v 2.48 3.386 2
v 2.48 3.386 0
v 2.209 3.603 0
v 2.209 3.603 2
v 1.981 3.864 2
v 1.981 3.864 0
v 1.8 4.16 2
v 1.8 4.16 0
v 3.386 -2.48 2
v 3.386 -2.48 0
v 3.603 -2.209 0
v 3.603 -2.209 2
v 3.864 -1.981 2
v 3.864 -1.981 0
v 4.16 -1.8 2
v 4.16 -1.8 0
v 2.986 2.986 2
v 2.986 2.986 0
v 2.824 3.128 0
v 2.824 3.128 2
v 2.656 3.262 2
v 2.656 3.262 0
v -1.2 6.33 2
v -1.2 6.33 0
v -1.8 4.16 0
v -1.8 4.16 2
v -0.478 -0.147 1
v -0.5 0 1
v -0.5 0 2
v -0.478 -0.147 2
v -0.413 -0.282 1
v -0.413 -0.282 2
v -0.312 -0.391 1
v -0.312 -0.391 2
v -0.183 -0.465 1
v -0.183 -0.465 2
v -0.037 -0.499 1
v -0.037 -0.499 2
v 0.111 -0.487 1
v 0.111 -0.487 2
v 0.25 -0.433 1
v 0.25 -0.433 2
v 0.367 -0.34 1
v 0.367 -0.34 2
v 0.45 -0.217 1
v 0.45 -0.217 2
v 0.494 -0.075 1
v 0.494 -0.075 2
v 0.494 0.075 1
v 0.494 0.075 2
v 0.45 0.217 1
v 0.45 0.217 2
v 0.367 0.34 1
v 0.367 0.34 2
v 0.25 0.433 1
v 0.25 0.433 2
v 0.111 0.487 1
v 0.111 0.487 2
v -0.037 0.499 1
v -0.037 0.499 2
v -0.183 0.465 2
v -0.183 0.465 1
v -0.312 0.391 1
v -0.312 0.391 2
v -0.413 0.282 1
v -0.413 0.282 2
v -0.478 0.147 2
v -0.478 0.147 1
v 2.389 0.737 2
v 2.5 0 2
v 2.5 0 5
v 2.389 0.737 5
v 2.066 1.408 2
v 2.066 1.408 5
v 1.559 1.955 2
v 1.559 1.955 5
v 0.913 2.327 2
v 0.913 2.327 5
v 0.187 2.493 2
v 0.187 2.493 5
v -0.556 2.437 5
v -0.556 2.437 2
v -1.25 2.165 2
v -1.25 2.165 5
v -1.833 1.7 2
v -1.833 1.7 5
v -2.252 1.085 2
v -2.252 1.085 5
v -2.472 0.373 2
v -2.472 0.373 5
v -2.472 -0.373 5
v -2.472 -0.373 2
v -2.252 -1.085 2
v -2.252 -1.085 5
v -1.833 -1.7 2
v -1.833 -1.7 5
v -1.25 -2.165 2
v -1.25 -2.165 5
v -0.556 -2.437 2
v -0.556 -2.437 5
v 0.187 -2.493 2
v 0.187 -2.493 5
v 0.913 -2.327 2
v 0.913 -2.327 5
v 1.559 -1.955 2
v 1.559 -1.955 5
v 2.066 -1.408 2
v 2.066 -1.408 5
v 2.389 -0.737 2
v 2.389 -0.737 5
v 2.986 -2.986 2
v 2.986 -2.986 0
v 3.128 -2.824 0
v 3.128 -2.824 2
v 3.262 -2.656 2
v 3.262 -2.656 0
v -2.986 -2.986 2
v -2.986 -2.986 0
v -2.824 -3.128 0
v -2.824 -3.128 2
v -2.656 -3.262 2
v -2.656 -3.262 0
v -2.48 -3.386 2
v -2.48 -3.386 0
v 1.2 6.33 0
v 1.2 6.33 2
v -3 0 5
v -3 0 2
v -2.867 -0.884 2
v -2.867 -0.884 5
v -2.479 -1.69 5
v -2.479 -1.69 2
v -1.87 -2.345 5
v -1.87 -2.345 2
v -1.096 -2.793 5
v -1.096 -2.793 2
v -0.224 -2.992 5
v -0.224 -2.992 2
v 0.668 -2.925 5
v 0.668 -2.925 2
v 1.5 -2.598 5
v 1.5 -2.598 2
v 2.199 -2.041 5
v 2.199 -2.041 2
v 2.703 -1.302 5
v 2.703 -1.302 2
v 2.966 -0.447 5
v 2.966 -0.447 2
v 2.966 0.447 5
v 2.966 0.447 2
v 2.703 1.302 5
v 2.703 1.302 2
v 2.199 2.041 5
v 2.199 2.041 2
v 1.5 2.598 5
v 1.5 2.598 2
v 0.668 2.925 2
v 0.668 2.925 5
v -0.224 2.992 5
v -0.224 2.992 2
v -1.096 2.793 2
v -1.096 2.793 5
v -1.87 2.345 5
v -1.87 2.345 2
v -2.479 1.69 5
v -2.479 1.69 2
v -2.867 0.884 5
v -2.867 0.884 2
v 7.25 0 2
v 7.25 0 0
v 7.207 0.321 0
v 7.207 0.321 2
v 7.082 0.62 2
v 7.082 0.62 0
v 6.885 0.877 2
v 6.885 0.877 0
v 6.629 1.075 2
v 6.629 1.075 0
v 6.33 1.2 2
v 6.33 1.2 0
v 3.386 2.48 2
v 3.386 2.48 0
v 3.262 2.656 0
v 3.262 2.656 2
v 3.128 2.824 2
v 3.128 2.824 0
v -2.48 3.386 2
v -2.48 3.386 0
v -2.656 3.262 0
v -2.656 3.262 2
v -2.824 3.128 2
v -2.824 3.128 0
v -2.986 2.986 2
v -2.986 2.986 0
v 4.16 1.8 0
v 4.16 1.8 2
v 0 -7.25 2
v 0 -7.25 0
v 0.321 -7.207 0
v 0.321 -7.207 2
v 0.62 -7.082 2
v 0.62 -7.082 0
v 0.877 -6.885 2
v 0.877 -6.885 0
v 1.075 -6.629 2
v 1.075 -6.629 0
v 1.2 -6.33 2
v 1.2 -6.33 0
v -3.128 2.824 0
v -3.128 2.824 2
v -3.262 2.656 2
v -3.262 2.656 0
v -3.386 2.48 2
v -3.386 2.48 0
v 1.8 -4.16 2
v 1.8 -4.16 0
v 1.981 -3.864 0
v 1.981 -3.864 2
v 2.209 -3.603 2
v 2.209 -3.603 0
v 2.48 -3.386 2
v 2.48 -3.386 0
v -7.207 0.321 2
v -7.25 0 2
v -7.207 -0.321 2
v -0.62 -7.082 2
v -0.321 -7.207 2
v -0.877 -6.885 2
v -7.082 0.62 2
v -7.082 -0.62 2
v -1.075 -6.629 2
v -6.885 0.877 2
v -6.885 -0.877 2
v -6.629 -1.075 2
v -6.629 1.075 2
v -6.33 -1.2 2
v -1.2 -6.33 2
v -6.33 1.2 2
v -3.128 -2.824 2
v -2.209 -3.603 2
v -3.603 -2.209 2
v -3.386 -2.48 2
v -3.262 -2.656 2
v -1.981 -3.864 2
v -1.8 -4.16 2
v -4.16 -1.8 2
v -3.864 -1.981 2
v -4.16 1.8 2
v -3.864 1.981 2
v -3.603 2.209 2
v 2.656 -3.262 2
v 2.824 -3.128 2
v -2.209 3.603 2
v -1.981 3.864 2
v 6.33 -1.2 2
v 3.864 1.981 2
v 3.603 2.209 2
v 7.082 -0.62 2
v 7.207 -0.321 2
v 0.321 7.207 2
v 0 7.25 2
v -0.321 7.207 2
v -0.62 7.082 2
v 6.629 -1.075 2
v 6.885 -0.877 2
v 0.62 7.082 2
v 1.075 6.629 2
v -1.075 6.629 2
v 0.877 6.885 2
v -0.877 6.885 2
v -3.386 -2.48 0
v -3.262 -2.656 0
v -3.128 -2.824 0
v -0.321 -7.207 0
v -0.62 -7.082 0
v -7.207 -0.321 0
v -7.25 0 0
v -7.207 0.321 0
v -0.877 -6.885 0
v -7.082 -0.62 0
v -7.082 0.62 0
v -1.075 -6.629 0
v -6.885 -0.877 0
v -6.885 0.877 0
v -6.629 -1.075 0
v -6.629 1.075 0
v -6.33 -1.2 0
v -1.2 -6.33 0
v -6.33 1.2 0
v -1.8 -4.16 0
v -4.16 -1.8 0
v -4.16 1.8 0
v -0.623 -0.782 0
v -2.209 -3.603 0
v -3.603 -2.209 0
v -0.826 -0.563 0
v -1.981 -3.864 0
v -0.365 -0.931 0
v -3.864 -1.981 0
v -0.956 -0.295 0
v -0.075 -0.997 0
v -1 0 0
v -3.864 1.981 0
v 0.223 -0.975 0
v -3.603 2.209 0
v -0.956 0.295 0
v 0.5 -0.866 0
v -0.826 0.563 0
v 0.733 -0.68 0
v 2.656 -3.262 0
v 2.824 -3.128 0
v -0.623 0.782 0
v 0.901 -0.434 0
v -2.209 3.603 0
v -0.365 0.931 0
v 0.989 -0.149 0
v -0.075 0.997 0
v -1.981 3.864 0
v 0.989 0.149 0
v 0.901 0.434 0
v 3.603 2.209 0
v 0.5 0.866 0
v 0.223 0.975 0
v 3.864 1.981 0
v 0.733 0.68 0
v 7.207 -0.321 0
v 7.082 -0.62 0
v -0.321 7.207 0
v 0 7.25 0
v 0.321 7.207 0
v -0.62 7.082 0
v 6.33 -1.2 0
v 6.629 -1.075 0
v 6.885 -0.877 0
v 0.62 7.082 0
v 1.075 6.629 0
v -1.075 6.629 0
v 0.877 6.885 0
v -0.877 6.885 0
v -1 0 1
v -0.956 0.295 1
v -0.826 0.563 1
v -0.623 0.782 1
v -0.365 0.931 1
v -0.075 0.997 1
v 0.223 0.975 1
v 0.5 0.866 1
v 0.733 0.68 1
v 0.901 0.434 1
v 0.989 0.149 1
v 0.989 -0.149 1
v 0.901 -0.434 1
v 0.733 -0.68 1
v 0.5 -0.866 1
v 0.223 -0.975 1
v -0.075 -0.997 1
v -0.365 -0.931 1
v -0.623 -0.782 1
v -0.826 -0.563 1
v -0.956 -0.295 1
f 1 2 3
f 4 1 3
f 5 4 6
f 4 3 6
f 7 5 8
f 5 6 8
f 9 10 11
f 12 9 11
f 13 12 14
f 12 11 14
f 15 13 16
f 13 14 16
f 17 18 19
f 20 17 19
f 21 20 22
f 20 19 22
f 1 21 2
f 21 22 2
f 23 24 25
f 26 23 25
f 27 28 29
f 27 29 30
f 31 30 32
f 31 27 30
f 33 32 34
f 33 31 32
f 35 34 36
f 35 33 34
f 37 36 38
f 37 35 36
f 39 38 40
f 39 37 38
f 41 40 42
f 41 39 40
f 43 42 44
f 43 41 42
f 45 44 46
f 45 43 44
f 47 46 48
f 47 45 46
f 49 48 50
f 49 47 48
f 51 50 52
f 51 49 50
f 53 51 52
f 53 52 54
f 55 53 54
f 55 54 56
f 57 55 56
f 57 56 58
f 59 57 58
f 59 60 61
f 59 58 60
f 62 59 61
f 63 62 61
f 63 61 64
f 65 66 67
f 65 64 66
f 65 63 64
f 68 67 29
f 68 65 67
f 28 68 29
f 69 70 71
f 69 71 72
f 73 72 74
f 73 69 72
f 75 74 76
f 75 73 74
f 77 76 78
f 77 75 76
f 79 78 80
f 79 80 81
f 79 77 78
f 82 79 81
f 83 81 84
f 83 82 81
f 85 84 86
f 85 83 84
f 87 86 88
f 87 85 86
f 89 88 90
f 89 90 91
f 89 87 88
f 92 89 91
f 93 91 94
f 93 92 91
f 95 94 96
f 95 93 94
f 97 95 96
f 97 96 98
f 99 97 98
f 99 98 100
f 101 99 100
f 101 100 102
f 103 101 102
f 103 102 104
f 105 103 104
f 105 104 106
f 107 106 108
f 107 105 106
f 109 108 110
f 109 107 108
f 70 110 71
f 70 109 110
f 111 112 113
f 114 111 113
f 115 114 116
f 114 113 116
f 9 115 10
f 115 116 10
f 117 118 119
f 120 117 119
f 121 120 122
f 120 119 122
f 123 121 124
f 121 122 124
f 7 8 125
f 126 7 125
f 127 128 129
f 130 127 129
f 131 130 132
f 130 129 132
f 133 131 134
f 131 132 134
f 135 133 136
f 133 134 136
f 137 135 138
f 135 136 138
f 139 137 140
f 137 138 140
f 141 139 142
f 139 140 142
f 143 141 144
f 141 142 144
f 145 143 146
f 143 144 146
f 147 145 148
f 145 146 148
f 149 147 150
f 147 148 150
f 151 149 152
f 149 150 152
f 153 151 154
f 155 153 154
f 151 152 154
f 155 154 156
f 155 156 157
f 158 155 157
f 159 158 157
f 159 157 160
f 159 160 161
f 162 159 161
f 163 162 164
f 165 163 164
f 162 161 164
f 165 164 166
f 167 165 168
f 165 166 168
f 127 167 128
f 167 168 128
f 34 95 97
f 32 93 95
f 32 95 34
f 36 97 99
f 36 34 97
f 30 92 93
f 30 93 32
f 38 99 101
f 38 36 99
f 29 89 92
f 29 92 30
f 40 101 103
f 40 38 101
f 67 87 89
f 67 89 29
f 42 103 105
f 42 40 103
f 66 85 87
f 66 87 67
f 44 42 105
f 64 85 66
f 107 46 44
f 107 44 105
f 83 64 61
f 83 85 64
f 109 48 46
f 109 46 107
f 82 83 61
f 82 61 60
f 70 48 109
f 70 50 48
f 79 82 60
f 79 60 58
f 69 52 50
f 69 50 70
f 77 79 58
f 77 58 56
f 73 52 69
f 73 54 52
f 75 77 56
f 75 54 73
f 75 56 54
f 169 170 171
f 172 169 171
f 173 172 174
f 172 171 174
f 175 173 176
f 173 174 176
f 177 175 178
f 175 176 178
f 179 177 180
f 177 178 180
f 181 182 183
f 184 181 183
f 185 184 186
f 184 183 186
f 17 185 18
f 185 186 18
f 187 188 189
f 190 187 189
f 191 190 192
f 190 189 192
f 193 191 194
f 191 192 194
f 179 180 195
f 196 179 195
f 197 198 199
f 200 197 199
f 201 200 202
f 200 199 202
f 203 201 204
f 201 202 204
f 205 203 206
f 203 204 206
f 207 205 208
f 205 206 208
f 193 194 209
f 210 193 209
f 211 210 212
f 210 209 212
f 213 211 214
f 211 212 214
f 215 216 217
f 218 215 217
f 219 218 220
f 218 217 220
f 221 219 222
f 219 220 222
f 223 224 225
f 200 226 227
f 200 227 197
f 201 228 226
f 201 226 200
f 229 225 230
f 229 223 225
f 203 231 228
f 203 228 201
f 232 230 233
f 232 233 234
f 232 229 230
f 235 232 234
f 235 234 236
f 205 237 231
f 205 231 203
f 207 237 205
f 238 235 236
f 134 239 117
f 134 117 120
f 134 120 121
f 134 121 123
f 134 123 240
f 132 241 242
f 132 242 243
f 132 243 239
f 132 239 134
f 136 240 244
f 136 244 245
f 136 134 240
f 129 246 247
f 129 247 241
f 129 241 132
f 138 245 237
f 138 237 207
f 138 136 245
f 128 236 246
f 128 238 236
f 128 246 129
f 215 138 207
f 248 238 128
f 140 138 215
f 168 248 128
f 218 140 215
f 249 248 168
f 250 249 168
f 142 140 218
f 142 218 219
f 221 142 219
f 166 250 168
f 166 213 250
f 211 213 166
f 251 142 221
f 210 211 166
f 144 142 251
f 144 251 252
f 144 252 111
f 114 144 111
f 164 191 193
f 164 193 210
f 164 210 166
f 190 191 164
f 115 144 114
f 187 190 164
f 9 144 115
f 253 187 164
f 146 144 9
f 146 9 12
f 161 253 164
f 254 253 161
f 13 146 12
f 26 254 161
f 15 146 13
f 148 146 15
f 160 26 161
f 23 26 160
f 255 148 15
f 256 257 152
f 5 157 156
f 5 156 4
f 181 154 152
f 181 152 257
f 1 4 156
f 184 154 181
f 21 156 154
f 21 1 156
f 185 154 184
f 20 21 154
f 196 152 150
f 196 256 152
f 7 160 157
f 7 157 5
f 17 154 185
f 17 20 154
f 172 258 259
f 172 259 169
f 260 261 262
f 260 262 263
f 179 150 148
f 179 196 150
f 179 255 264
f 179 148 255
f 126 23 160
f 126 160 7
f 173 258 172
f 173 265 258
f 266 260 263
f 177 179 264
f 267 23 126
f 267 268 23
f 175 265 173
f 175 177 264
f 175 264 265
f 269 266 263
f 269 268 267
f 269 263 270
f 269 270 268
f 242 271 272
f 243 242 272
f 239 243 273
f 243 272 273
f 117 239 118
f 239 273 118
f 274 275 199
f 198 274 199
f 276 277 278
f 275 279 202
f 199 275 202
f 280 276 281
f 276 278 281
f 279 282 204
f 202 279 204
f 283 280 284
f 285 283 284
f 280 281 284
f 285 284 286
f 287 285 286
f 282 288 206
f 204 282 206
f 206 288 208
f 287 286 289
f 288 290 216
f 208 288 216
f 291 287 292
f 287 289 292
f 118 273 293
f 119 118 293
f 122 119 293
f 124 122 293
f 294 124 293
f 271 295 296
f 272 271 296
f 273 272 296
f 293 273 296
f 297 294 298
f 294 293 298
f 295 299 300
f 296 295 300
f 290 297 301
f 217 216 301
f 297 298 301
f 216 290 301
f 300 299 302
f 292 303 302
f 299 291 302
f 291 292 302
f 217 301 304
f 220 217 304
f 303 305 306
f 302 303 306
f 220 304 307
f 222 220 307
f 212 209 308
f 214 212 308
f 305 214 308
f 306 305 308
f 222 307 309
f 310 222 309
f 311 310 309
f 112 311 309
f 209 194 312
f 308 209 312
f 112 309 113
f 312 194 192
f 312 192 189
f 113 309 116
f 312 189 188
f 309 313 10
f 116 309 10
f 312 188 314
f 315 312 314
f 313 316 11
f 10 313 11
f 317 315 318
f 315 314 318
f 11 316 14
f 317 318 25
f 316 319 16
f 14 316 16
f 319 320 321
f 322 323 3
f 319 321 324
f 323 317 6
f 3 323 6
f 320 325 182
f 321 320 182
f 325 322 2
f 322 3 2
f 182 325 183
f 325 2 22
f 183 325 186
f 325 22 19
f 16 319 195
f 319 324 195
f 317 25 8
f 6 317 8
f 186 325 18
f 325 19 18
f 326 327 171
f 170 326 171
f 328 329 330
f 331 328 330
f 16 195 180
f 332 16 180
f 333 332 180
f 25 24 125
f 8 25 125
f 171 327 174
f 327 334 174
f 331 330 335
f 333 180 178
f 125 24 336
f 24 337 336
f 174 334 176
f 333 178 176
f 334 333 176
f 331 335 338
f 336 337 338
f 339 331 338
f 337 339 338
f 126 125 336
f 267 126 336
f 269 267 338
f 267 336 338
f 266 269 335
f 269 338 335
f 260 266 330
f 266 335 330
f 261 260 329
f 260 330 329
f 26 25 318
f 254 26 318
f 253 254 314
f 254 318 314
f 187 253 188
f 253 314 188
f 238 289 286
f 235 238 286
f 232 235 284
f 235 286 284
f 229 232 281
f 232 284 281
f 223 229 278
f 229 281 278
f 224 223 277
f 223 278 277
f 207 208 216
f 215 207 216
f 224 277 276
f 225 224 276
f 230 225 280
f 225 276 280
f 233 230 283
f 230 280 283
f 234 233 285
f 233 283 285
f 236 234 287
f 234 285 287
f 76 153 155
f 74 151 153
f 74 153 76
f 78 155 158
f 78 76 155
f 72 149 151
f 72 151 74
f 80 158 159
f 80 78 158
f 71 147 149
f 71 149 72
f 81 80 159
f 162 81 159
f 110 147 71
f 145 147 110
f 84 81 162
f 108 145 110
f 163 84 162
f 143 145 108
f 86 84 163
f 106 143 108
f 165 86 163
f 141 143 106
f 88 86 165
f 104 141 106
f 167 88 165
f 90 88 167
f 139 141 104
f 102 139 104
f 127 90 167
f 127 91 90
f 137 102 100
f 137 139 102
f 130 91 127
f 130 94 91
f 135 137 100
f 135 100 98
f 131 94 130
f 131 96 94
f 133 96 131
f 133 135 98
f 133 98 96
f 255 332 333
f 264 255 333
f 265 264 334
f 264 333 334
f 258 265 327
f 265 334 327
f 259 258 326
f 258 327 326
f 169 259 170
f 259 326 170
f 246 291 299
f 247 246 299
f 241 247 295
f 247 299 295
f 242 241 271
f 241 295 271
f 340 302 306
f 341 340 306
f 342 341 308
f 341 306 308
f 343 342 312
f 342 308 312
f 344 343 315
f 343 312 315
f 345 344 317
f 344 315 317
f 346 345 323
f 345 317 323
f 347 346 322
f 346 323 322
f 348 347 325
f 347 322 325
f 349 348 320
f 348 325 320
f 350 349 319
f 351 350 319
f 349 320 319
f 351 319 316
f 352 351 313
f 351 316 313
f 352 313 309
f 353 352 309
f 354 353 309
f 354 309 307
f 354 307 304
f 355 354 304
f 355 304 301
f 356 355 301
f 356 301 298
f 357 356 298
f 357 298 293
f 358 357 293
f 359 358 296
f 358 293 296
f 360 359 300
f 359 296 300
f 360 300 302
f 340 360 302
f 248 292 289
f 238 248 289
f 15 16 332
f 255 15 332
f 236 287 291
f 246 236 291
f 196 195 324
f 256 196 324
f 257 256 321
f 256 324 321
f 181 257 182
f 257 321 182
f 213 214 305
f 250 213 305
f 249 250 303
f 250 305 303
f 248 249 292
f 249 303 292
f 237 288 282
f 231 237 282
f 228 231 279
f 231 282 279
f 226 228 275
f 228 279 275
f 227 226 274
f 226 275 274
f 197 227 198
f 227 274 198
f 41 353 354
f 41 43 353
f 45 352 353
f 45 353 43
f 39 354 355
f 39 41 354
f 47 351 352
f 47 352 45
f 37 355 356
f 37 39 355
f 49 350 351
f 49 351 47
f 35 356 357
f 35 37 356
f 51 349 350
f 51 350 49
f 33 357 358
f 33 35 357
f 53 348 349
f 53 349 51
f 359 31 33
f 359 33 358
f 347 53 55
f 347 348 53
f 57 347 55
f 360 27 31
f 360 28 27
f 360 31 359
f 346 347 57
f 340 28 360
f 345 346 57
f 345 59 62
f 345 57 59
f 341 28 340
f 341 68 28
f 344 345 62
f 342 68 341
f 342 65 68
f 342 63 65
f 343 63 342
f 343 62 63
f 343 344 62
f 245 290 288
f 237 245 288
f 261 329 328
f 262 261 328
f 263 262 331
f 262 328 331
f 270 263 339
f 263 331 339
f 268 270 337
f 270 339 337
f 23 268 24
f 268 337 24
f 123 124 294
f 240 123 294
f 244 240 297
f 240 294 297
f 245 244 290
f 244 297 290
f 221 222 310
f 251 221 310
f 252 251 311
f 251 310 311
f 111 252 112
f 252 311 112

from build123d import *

# Parameters (mm, degrees)
BOSS_EXTRUDE1_DEPTH = 2
SKETCH2_R           = 3
SKETCH2_R_2         = 2.5
BOSS_EXTRUDE2_DEPTH = 3
SKETCH3_R           = 1
CUT_EXTRUDE1_DEPTH  = 1
SKETCH4_R           = 0.5
CUT_EXTRUDE2_DEPTH  = 12.407234547


with BuildPart() as part:
    # Sketch1 → Boss-Extrude1 (new body)
    with BuildSketch(Plane.XY):
        with BuildLine():
            Line((-1.2, 6.33), (-1.8, 4.16))
            ThreePointArc((-1.8, 4.16), (-2.089343599, 3.728660349), (-2.48, 3.386372183))
            ThreePointArc((-2.48, 3.386372183), (-2.740944688, 3.196252087), (-2.985706385, 2.985706385))
            ThreePointArc((-2.985706385, 2.985706385), (-3.196252087, 2.740944688), (-3.386372183, 2.48))
            ThreePointArc((-3.386372183, 2.48), (-3.728660349, 2.089343599), (-4.16, 1.8))
            Line((-4.16, 1.8), (-6.33, 1.2))
            ThreePointArc((-6.33, 1.2), (-6.992020752, 0.754882576), (-7.25, 0))
            ThreePointArc((-7.25, 0), (-6.992020752, -0.754882576), (-6.33, -1.2))
            Line((-6.33, -1.2), (-4.16, -1.8))
            ThreePointArc((-4.16, -1.8), (-3.728660349, -2.089343599), (-3.386372183, -2.48))
            ThreePointArc((-3.386372183, -2.48), (-3.196252087, -2.740944688), (-2.985706385, -2.985706385))
            ThreePointArc((-2.985706385, -2.985706385), (-2.740944688, -3.196252087), (-2.48, -3.386372183))
            ThreePointArc((-2.48, -3.386372183), (-2.089343599, -3.728660349), (-1.8, -4.16))
            Line((-1.8, -4.16), (-1.2, -6.33))
            ThreePointArc((-1.2, -6.33), (-0.754882576, -6.992020752), (0, -7.25))
            ThreePointArc((0, -7.25), (0.754882576, -6.992020752), (1.2, -6.33))
            Line((1.2, -6.33), (1.8, -4.16))
            ThreePointArc((1.8, -4.16), (2.089343599, -3.728660349), (2.48, -3.386372183))
            ThreePointArc((2.48, -3.386372183), (2.740944688, -3.196252087), (2.985706385, -2.985706385))
            ThreePointArc((2.985706385, -2.985706385), (3.196252087, -2.740944688), (3.386372183, -2.48))
            ThreePointArc((3.386372183, -2.48), (3.728660349, -2.089343599), (4.16, -1.8))
            Line((4.16, -1.8), (6.33, -1.2))
            ThreePointArc((6.33, -1.2), (6.992020752, -0.754882576), (7.25, 0))
            ThreePointArc((7.25, 0), (6.992020752, 0.754882576), (6.33, 1.2))
            Line((6.33, 1.2), (4.16, 1.8))
            ThreePointArc((4.16, 1.8), (3.728660349, 2.089343599), (3.386372183, 2.48))
            ThreePointArc((3.386372183, 2.48), (3.196252087, 2.740944688), (2.985706385, 2.985706385))
            ThreePointArc((2.985706385, 2.985706385), (2.740944688, 3.196252087), (2.48, 3.386372183))
            ThreePointArc((2.48, 3.386372183), (2.089343599, 3.728660349), (1.8, 4.16))
            Line((1.8, 4.16), (1.2, 6.33))
            ThreePointArc((1.2, 6.33), (0.754882576, 6.992020752), (0, 7.25))
            ThreePointArc((0, 7.25), (-0.754882576, 6.992020752), (-1.2, 6.33))
        make_face()
    extrude(amount=BOSS_EXTRUDE1_DEPTH)

    # Sketch2 → Boss-Extrude2 (add)
    with BuildSketch(Plane.XY.offset(2)):
        with Locations(Location((0, 0, 0), (0, 0, 180))):
            Circle(SKETCH2_R)
        Circle(SKETCH2_R_2, mode=Mode.SUBTRACT)
    extrude(amount=BOSS_EXTRUDE2_DEPTH)

    # Sketch3 → Cut-Extrude1 (cut)
    with BuildSketch(Plane(origin=(0, 0, 0), x_dir=(-1, 0, 0), z_dir=(0, 0, -1))):
        Circle(SKETCH3_R)
    extrude(amount=-CUT_EXTRUDE1_DEPTH, mode=Mode.SUBTRACT)

    # Sketch4 → Cut-Extrude2 (cut, through all)
    with BuildSketch(Plane.XY):
        with Locations(Location((0, 0, 0), (0, 0, 180))):
            Circle(SKETCH4_R)
    extrude(amount=CUT_EXTRUDE2_DEPTH, mode=Mode.SUBTRACT)


solid = part.part
